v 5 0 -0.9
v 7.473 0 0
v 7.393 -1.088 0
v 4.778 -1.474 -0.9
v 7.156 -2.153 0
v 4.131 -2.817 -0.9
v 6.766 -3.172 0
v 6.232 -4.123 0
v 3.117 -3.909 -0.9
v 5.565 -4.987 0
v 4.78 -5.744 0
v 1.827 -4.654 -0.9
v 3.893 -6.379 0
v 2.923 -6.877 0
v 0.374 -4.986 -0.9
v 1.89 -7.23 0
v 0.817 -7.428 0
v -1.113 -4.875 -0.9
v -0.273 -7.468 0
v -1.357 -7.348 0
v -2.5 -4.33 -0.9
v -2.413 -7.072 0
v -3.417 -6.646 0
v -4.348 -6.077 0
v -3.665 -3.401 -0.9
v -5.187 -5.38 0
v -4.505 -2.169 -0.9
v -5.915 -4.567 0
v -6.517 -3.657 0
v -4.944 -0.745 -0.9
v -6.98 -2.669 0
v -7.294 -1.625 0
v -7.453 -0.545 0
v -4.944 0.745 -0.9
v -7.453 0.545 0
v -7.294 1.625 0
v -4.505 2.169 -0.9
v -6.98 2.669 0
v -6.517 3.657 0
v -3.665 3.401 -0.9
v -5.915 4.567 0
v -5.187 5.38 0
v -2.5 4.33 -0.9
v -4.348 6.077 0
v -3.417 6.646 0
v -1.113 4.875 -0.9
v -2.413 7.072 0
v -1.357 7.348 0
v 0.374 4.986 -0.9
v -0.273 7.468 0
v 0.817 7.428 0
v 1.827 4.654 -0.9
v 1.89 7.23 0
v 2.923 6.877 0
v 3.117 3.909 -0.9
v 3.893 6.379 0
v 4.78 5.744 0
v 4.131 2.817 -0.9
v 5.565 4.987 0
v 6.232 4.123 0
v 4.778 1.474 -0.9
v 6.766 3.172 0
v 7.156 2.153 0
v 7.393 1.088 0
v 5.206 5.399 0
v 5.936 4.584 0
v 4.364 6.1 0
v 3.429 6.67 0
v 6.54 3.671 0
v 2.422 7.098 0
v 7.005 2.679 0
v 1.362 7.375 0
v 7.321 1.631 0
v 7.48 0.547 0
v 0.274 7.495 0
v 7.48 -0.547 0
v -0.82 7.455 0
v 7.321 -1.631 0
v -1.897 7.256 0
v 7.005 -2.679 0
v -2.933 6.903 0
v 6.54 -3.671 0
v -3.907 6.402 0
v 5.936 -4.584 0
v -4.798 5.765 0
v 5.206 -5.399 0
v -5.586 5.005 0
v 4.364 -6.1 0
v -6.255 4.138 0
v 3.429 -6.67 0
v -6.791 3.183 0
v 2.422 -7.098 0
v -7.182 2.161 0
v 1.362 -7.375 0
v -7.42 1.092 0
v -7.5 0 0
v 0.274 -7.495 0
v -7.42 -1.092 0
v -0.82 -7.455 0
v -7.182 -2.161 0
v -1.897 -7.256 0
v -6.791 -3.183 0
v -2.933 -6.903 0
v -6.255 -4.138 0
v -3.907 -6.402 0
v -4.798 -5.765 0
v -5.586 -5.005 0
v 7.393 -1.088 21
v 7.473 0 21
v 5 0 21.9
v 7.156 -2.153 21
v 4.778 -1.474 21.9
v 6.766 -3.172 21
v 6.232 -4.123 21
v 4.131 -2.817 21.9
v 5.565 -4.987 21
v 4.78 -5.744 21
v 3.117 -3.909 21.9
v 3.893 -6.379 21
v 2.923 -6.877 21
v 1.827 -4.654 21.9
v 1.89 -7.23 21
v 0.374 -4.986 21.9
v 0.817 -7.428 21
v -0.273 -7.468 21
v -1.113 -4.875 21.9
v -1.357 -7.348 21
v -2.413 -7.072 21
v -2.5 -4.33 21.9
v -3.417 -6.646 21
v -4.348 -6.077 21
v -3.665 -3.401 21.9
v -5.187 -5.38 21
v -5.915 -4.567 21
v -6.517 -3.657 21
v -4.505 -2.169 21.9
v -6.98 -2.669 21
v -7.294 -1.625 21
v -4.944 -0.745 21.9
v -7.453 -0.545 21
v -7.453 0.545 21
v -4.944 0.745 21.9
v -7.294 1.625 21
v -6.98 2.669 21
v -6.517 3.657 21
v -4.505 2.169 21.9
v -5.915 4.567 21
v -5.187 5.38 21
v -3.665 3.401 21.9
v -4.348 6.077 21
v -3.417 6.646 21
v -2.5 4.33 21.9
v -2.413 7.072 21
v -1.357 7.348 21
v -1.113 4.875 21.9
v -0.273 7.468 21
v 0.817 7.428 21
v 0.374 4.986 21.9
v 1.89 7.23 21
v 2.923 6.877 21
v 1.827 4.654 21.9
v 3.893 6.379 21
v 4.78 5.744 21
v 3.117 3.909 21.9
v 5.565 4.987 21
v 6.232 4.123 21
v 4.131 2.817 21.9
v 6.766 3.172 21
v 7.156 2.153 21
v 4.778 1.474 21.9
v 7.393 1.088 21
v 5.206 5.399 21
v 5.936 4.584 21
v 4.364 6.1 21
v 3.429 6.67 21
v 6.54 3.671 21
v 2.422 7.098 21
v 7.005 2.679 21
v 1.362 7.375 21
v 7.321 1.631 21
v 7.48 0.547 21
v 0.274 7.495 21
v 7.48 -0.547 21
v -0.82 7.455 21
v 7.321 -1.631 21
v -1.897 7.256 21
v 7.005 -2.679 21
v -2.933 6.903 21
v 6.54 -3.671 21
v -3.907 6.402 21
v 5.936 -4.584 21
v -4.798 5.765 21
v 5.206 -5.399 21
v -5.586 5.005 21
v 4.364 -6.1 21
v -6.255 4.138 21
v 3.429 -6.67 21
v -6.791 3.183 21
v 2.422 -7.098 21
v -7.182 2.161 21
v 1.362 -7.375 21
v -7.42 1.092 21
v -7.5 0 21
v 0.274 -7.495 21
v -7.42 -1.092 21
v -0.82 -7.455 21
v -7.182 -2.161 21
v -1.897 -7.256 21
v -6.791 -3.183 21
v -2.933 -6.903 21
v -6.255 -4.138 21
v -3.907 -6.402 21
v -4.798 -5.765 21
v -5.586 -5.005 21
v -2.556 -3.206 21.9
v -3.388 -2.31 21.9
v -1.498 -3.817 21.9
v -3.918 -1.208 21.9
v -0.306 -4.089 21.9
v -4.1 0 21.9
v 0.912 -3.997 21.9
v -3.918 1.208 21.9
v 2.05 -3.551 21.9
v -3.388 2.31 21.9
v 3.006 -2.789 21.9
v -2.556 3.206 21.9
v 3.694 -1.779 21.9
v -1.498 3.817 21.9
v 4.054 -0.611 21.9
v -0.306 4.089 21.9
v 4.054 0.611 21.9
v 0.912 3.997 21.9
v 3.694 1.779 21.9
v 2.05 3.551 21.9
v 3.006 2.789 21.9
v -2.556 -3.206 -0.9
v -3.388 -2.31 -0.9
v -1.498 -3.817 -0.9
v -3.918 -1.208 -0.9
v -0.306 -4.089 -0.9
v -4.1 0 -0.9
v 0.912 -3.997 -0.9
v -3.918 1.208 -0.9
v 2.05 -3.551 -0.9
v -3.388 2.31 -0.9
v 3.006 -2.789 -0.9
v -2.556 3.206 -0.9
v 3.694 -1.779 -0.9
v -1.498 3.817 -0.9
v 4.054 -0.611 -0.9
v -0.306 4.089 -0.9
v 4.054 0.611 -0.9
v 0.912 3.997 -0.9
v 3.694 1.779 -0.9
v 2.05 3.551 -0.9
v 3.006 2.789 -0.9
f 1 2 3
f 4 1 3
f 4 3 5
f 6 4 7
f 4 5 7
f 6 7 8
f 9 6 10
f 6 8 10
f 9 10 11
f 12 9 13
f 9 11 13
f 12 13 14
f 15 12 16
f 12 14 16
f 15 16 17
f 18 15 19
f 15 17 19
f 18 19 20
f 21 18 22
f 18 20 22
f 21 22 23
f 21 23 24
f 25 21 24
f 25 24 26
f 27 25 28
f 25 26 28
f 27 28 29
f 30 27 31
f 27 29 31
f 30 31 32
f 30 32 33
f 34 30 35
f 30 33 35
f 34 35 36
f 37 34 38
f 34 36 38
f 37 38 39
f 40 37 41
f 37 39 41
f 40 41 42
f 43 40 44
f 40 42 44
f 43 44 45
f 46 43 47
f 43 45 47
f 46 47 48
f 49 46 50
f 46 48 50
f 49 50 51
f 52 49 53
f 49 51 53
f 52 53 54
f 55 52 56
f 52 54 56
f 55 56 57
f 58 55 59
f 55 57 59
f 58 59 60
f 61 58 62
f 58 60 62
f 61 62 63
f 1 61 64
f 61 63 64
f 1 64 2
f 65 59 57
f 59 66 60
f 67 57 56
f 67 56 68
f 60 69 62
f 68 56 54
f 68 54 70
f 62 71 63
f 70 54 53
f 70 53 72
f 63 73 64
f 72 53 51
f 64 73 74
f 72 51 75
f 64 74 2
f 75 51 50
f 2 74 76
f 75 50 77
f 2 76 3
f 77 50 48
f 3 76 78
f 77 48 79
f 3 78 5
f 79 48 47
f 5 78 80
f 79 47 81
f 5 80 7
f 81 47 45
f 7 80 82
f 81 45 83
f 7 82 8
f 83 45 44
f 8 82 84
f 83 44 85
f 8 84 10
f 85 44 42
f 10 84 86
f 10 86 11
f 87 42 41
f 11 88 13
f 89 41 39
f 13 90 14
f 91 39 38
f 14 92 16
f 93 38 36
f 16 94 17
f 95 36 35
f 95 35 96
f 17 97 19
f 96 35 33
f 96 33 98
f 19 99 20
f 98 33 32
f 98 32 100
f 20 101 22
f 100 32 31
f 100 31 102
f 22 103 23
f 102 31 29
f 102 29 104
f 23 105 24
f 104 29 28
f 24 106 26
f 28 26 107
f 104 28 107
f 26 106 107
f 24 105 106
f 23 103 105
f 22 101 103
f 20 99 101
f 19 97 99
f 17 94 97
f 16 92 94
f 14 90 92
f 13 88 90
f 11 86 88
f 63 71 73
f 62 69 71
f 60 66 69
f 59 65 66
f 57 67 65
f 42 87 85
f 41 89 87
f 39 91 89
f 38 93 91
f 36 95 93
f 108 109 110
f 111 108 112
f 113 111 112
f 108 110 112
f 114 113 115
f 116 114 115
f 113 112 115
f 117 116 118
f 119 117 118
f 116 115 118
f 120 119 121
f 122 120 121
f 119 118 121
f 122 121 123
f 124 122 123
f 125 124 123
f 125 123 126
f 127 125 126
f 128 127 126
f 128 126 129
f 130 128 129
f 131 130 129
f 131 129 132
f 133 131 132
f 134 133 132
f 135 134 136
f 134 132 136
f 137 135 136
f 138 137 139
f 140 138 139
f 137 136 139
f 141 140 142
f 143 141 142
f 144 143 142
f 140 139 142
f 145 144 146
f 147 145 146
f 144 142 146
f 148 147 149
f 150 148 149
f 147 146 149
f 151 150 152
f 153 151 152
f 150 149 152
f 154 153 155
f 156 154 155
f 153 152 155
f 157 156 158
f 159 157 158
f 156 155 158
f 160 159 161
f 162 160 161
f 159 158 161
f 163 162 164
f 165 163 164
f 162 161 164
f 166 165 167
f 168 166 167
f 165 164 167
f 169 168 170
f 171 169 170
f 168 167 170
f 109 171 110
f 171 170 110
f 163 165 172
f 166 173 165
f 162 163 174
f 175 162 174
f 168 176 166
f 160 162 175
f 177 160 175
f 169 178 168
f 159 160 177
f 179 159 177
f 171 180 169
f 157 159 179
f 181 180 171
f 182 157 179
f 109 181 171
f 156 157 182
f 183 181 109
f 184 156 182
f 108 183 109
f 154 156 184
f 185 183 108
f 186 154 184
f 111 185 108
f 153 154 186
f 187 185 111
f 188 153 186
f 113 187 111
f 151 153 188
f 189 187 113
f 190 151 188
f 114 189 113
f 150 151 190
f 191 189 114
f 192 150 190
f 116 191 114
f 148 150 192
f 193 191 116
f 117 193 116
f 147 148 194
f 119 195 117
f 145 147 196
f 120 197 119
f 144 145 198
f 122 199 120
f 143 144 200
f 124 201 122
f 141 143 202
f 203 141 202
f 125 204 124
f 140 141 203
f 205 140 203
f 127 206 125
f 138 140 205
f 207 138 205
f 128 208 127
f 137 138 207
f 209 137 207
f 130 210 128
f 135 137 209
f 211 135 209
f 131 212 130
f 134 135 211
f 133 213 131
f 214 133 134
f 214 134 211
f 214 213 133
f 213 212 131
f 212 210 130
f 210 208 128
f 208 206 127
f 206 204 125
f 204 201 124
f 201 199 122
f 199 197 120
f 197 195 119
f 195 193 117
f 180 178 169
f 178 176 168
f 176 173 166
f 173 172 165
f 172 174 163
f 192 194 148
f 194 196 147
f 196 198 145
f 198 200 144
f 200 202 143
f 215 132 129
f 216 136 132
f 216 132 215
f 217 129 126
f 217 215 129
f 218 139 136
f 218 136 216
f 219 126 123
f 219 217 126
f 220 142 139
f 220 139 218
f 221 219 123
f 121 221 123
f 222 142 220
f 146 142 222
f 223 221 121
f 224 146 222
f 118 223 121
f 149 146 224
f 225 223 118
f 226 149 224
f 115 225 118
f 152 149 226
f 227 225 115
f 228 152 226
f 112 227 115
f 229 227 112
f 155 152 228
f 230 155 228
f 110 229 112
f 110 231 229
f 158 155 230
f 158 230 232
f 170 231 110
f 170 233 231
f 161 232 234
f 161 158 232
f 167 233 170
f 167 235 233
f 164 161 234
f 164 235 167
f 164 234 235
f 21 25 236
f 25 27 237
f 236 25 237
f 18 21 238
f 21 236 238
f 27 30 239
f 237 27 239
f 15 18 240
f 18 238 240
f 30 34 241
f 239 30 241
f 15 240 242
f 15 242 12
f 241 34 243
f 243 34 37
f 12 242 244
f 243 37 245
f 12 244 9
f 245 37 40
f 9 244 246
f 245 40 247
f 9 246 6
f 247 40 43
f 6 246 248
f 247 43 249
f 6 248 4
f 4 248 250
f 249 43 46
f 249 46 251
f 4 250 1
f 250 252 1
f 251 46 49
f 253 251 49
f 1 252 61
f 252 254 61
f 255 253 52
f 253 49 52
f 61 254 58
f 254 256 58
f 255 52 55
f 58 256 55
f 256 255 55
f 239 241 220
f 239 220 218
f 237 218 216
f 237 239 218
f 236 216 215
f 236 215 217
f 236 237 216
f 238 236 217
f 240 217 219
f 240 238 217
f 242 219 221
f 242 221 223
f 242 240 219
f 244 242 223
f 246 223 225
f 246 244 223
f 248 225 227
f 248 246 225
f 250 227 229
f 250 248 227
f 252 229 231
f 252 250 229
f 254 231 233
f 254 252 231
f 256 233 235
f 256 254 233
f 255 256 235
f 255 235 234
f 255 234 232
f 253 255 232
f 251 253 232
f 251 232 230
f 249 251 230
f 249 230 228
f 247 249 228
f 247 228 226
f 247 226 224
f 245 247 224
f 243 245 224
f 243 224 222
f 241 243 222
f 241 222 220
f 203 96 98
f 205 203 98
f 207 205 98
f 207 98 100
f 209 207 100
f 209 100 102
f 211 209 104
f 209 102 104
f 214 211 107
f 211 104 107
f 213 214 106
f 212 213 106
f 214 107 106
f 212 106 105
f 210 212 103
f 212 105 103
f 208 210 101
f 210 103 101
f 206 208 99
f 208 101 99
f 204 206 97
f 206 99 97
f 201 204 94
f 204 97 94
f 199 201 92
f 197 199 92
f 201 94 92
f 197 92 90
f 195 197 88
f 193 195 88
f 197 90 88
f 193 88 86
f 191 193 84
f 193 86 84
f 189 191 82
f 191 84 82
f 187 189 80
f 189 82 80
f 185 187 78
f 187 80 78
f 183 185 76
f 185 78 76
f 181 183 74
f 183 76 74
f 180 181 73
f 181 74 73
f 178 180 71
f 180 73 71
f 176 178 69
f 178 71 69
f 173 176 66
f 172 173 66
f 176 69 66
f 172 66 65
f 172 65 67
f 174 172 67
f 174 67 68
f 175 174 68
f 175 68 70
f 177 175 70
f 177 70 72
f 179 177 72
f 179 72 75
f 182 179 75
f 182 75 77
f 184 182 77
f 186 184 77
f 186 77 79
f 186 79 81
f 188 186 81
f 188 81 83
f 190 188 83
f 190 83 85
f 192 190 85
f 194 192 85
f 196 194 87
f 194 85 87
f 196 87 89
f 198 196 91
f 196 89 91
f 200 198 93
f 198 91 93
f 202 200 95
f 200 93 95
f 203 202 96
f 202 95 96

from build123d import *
from OCP.BRepFilletAPI import BRepFilletAPI_MakeChamfer

# Parameters (mm, degrees)
SKETCH1_R           = 7.5
SKETCH1_R_2         = 4.1
BOSS_EXTRUDE1_DEPTH = 21
BOSS_EXTRUDE2_START = -0.9
SKETCH2_R           = 5
SKETCH2_R_2         = 4.1
BOSS_EXTRUDE2_DEPTH = 22.8
CHAMFER1_SIZE       = 0.9
CHAMFER1_SIZE_2     = 2.472729678


with BuildPart() as part:
    # Sketch1 → Boss-Extrude1 (new body)
    with BuildSketch(Plane.XY):
        with Locations(Location((0, 0, 0), (0, 0, 180))):
            Circle(SKETCH1_R)
        with Locations(Location((0, 0, 0), (0, 0, 180))):
            Circle(SKETCH1_R_2, mode=Mode.SUBTRACT)
    extrude(amount=BOSS_EXTRUDE1_DEPTH)

    # Sketch2 → Boss-Extrude2 (add)
    with BuildSketch(Plane.XY.offset(BOSS_EXTRUDE2_START)):
        Circle(SKETCH2_R)
        with Locations(Location((0, 0, 0), (0, 0, 180))):
            Circle(SKETCH2_R_2, mode=Mode.SUBTRACT)
    extrude(amount=BOSS_EXTRUDE2_DEPTH)

    # Chamfer1
    chamfer1_edges_1 = [part.edges().sort_by_distance(p)[0] for p in [
        (-5, 0, 0),
    ]]
    chamfer1_side_1 = [part.faces().sort_by_distance(p)[0] for p in [
        (-5, 0, -0.018),
    ]]
    chamfer1_edges_2 = [part.edges().sort_by_distance(p)[0] for p in [
        (-5, 0, 21),
    ]]
    chamfer1_side_2 = [part.faces().sort_by_distance(p)[0] for p in [
        (-5.018, 0, 21),
    ]]
    chamfer1 = BRepFilletAPI_MakeChamfer(part.part.solid().wrapped)
    for e in chamfer1_edges_1:
        chamfer1.Add(CHAMFER1_SIZE - 0.0001, CHAMFER1_SIZE_2 - 0.0001, e.wrapped, chamfer1_side_1[0].wrapped)
    for e in chamfer1_edges_2:
        chamfer1.Add(CHAMFER1_SIZE_2 - 0.0001, CHAMFER1_SIZE - 0.0001, e.wrapped, chamfer1_side_2[0].wrapped)
    add(Compound.cast(chamfer1.Shape()), mode=Mode.REPLACE)  # a hair under: the kernel refuses the full size


solid = part.part
